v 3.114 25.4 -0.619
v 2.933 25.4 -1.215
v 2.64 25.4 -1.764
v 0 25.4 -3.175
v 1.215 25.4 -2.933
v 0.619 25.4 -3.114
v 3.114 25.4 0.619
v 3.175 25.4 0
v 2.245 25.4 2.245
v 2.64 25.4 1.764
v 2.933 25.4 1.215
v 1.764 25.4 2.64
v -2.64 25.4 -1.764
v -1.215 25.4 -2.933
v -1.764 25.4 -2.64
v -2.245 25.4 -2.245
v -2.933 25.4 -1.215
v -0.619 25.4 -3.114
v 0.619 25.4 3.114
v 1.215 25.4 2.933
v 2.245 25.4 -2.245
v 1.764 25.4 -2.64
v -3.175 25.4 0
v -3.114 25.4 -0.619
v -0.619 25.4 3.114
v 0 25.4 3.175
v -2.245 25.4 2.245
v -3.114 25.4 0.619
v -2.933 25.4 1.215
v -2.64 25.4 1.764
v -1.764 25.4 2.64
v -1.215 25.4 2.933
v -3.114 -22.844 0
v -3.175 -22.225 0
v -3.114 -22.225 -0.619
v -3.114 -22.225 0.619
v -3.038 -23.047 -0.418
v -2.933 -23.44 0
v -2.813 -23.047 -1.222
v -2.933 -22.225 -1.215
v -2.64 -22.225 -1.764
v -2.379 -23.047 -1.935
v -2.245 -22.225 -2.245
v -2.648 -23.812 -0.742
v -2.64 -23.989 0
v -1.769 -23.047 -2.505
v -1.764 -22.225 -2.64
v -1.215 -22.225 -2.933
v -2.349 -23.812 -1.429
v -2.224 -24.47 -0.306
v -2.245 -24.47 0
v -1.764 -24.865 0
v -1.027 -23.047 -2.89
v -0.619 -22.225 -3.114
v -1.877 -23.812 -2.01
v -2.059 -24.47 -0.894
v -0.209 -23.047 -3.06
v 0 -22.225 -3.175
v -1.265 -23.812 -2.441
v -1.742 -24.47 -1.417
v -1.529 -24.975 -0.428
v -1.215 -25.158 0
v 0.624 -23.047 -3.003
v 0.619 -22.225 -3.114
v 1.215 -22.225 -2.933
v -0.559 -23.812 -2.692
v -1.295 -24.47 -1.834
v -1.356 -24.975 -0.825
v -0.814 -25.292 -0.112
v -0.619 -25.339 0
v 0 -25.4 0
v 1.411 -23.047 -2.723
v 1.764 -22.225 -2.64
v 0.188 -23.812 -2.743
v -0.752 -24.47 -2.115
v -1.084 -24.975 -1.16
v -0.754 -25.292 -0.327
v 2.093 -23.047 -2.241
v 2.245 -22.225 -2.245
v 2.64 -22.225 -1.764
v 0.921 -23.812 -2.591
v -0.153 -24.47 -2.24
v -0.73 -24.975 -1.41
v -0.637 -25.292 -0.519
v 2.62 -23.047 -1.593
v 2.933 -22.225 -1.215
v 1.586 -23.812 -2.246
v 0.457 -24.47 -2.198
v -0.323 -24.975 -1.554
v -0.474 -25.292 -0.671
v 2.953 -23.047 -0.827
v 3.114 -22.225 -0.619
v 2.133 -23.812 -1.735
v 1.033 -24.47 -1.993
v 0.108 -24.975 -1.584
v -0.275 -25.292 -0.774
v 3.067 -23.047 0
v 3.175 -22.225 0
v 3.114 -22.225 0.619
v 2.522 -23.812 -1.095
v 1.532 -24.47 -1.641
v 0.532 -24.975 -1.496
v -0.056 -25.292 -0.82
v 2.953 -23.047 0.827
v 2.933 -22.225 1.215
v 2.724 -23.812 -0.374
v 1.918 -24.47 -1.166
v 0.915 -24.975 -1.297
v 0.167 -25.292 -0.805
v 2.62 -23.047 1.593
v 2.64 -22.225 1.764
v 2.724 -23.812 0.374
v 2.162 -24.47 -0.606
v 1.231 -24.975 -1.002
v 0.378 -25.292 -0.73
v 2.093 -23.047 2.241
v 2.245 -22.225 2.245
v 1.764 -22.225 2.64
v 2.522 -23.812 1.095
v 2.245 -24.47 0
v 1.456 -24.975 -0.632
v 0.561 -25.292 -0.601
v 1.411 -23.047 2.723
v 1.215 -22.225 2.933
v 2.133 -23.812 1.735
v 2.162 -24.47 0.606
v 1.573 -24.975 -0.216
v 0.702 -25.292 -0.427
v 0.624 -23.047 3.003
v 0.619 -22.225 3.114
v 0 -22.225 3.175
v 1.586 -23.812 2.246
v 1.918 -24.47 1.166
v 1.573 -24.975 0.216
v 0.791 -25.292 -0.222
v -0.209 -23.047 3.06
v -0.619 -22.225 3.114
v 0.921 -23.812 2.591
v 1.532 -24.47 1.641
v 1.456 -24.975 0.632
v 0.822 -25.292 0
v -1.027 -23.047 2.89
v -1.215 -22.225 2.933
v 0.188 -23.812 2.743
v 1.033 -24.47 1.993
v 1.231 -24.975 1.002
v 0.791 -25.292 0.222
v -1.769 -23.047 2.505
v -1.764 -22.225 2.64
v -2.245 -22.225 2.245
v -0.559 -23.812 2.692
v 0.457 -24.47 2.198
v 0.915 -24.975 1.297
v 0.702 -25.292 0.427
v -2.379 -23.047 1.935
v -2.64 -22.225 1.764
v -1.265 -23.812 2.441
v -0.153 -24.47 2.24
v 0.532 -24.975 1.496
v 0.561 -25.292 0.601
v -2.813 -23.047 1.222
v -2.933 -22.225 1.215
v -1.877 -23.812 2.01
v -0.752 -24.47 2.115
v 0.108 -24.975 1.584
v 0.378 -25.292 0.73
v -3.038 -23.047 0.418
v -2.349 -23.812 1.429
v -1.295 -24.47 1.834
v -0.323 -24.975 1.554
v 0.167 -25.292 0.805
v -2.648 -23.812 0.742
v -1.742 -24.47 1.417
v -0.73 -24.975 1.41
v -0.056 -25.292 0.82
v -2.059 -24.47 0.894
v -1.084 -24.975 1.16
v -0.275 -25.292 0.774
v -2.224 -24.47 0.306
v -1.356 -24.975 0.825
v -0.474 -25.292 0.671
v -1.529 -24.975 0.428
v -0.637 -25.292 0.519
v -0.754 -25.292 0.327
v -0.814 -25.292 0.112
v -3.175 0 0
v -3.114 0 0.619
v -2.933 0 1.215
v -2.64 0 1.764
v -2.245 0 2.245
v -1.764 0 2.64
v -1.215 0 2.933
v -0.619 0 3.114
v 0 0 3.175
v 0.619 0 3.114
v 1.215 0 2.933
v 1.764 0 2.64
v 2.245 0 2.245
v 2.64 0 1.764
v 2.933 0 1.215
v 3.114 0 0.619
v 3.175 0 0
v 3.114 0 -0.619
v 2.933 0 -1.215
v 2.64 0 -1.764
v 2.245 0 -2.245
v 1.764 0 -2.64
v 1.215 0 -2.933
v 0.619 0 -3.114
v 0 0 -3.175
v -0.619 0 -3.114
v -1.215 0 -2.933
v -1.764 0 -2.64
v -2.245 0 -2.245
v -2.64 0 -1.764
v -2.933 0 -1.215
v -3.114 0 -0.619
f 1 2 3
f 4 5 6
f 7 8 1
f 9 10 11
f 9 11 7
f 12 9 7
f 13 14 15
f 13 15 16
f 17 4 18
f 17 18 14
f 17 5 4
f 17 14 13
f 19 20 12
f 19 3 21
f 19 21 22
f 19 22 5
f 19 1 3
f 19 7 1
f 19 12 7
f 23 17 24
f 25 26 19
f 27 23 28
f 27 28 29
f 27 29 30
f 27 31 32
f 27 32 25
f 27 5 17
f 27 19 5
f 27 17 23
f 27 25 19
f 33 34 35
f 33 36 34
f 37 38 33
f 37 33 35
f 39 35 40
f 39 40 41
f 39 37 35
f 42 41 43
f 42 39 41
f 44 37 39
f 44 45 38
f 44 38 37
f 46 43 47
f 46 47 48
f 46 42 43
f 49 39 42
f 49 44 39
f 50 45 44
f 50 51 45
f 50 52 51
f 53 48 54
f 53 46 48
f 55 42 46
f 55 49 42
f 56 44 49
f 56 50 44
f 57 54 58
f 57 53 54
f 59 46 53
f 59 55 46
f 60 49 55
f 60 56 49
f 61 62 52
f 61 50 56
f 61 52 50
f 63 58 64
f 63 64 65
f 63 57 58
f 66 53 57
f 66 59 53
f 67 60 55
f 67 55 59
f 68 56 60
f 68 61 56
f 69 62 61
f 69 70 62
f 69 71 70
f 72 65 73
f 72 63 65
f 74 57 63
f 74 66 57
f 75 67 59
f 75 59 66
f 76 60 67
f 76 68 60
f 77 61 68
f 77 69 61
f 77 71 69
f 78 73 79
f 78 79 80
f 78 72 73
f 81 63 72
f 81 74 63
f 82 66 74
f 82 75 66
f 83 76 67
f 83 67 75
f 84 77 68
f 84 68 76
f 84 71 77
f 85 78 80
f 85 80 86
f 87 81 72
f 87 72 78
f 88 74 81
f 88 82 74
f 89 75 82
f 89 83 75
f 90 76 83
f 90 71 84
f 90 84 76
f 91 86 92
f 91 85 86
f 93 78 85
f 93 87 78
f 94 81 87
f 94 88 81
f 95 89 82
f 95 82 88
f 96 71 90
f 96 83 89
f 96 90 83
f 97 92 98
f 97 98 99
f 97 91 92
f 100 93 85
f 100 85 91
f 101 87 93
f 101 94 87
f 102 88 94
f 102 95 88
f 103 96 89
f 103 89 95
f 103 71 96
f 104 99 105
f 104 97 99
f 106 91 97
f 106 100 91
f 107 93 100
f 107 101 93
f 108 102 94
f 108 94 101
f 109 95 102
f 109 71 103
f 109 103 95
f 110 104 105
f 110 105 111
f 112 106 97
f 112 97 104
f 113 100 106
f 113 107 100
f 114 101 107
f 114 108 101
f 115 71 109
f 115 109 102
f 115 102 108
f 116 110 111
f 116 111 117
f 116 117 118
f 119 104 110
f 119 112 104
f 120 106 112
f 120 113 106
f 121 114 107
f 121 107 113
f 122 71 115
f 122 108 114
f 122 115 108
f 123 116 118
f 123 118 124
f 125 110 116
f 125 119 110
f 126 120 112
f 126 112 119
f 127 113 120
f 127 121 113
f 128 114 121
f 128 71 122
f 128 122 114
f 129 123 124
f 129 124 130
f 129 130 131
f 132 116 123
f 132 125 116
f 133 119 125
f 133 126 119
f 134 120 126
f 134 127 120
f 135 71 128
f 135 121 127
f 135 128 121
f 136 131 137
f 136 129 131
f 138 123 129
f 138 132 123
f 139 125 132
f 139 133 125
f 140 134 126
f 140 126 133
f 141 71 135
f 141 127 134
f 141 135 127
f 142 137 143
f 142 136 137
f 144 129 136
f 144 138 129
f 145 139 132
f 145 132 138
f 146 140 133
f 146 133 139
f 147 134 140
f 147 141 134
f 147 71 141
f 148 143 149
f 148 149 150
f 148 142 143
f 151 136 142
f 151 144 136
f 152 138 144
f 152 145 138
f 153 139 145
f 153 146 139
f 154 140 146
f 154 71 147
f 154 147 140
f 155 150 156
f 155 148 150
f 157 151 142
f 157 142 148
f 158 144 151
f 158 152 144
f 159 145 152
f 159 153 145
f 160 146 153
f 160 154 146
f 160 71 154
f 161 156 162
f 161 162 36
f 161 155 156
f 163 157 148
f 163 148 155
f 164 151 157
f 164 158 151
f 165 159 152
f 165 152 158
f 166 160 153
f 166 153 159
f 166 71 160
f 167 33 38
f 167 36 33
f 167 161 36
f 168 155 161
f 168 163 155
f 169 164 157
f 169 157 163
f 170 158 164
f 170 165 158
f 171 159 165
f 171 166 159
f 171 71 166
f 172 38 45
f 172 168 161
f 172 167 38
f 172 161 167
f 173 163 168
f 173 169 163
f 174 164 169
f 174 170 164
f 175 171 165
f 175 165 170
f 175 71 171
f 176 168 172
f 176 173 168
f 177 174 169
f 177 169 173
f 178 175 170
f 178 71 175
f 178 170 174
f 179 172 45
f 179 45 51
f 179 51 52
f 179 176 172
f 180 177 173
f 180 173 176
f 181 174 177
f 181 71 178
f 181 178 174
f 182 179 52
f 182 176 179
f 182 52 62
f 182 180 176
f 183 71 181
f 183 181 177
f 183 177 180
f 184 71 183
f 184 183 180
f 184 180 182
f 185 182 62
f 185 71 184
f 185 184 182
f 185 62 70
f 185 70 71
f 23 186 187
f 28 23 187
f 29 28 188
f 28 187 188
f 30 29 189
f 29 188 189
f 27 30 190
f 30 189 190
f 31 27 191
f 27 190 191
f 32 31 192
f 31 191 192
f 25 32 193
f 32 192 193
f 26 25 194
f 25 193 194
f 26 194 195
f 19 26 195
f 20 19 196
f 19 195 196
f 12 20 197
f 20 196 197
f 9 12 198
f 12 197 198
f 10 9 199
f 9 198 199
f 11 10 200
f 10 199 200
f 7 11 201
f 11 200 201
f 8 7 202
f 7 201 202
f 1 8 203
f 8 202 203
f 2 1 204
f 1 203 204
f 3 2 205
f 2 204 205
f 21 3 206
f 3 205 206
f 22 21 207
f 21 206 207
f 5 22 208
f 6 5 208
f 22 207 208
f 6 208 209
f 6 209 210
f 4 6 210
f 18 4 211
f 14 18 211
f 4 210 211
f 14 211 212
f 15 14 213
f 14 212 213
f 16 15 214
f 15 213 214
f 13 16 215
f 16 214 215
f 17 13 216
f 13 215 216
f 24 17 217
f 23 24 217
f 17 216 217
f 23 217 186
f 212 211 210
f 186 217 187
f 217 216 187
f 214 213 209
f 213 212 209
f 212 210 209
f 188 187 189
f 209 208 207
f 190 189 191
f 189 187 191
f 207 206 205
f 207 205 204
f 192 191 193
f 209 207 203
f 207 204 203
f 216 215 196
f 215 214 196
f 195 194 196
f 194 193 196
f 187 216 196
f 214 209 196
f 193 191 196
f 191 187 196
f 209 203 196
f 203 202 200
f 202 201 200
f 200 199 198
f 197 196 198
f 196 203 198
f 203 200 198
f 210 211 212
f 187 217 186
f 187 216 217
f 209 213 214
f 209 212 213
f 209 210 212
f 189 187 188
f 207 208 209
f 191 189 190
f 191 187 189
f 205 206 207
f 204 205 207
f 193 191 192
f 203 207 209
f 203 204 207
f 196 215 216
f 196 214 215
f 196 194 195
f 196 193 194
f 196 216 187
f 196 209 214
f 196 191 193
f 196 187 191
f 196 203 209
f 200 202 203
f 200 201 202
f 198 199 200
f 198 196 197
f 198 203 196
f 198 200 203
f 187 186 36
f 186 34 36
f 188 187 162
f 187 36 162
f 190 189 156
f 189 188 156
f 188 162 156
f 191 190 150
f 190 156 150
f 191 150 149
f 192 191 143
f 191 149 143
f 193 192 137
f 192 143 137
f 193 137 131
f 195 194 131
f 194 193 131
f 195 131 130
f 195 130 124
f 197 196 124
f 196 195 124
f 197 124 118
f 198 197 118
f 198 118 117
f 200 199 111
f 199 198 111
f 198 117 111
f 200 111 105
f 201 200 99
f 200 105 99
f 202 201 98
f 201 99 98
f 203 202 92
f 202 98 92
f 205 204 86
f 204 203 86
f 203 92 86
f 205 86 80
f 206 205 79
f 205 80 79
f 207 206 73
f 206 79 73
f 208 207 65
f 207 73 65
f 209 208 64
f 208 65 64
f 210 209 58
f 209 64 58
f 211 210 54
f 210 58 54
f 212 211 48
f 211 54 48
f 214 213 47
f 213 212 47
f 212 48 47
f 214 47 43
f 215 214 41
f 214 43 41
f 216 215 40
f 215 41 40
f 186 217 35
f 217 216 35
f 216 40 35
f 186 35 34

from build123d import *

# Parameters (mm, degrees)
SKETCH3_R           = 3.175
BOSS_EXTRUDE1_DEPTH = 25.4


with BuildPart() as part:
    # Sketch1 → Revolve1 (revolve)
    with BuildSketch(Plane.XY, mode=Mode.PRIVATE) as revolve1_sk:
        with BuildLine():
            Line((0, 0), (3.175, 0))
            Line((3.175, 0), (3.175, -22.225))
            ThreePointArc((3.175, -22.225), (2.24506403, -24.47006403), (0, -25.4))
            Line((0, -25.4), (0, 0))
        make_face()
    revolve(revolve1_sk.sketch.rotate(Axis((0, 0, 0), (0, -1, 0)), 180), axis=Axis((0, 0, 0), (0, -1, 0)))

    # Sketch3 → Boss-Extrude1 (add)
    with BuildSketch(Plane(origin=(0, 0, 0), x_dir=(1, 0, 0), z_dir=(0, 1, 0))):
        with Locations(Location((0, 0, 0), (0, 0, 180))):
            Circle(SKETCH3_R)
    extrude(amount=BOSS_EXTRUDE1_DEPTH)


with BuildPart() as body_2:
    # Split1: the piece on the far side of the plane
    add(part.part)
    split(bisect_by=Plane.ZX, keep=Keep.BOTTOM)


with BuildPart() as part_1:
    add(part.part)

    # Split1
    split(bisect_by=Plane.ZX, keep=Keep.TOP)


solid = Compound([body_2.part, part_1.part])
